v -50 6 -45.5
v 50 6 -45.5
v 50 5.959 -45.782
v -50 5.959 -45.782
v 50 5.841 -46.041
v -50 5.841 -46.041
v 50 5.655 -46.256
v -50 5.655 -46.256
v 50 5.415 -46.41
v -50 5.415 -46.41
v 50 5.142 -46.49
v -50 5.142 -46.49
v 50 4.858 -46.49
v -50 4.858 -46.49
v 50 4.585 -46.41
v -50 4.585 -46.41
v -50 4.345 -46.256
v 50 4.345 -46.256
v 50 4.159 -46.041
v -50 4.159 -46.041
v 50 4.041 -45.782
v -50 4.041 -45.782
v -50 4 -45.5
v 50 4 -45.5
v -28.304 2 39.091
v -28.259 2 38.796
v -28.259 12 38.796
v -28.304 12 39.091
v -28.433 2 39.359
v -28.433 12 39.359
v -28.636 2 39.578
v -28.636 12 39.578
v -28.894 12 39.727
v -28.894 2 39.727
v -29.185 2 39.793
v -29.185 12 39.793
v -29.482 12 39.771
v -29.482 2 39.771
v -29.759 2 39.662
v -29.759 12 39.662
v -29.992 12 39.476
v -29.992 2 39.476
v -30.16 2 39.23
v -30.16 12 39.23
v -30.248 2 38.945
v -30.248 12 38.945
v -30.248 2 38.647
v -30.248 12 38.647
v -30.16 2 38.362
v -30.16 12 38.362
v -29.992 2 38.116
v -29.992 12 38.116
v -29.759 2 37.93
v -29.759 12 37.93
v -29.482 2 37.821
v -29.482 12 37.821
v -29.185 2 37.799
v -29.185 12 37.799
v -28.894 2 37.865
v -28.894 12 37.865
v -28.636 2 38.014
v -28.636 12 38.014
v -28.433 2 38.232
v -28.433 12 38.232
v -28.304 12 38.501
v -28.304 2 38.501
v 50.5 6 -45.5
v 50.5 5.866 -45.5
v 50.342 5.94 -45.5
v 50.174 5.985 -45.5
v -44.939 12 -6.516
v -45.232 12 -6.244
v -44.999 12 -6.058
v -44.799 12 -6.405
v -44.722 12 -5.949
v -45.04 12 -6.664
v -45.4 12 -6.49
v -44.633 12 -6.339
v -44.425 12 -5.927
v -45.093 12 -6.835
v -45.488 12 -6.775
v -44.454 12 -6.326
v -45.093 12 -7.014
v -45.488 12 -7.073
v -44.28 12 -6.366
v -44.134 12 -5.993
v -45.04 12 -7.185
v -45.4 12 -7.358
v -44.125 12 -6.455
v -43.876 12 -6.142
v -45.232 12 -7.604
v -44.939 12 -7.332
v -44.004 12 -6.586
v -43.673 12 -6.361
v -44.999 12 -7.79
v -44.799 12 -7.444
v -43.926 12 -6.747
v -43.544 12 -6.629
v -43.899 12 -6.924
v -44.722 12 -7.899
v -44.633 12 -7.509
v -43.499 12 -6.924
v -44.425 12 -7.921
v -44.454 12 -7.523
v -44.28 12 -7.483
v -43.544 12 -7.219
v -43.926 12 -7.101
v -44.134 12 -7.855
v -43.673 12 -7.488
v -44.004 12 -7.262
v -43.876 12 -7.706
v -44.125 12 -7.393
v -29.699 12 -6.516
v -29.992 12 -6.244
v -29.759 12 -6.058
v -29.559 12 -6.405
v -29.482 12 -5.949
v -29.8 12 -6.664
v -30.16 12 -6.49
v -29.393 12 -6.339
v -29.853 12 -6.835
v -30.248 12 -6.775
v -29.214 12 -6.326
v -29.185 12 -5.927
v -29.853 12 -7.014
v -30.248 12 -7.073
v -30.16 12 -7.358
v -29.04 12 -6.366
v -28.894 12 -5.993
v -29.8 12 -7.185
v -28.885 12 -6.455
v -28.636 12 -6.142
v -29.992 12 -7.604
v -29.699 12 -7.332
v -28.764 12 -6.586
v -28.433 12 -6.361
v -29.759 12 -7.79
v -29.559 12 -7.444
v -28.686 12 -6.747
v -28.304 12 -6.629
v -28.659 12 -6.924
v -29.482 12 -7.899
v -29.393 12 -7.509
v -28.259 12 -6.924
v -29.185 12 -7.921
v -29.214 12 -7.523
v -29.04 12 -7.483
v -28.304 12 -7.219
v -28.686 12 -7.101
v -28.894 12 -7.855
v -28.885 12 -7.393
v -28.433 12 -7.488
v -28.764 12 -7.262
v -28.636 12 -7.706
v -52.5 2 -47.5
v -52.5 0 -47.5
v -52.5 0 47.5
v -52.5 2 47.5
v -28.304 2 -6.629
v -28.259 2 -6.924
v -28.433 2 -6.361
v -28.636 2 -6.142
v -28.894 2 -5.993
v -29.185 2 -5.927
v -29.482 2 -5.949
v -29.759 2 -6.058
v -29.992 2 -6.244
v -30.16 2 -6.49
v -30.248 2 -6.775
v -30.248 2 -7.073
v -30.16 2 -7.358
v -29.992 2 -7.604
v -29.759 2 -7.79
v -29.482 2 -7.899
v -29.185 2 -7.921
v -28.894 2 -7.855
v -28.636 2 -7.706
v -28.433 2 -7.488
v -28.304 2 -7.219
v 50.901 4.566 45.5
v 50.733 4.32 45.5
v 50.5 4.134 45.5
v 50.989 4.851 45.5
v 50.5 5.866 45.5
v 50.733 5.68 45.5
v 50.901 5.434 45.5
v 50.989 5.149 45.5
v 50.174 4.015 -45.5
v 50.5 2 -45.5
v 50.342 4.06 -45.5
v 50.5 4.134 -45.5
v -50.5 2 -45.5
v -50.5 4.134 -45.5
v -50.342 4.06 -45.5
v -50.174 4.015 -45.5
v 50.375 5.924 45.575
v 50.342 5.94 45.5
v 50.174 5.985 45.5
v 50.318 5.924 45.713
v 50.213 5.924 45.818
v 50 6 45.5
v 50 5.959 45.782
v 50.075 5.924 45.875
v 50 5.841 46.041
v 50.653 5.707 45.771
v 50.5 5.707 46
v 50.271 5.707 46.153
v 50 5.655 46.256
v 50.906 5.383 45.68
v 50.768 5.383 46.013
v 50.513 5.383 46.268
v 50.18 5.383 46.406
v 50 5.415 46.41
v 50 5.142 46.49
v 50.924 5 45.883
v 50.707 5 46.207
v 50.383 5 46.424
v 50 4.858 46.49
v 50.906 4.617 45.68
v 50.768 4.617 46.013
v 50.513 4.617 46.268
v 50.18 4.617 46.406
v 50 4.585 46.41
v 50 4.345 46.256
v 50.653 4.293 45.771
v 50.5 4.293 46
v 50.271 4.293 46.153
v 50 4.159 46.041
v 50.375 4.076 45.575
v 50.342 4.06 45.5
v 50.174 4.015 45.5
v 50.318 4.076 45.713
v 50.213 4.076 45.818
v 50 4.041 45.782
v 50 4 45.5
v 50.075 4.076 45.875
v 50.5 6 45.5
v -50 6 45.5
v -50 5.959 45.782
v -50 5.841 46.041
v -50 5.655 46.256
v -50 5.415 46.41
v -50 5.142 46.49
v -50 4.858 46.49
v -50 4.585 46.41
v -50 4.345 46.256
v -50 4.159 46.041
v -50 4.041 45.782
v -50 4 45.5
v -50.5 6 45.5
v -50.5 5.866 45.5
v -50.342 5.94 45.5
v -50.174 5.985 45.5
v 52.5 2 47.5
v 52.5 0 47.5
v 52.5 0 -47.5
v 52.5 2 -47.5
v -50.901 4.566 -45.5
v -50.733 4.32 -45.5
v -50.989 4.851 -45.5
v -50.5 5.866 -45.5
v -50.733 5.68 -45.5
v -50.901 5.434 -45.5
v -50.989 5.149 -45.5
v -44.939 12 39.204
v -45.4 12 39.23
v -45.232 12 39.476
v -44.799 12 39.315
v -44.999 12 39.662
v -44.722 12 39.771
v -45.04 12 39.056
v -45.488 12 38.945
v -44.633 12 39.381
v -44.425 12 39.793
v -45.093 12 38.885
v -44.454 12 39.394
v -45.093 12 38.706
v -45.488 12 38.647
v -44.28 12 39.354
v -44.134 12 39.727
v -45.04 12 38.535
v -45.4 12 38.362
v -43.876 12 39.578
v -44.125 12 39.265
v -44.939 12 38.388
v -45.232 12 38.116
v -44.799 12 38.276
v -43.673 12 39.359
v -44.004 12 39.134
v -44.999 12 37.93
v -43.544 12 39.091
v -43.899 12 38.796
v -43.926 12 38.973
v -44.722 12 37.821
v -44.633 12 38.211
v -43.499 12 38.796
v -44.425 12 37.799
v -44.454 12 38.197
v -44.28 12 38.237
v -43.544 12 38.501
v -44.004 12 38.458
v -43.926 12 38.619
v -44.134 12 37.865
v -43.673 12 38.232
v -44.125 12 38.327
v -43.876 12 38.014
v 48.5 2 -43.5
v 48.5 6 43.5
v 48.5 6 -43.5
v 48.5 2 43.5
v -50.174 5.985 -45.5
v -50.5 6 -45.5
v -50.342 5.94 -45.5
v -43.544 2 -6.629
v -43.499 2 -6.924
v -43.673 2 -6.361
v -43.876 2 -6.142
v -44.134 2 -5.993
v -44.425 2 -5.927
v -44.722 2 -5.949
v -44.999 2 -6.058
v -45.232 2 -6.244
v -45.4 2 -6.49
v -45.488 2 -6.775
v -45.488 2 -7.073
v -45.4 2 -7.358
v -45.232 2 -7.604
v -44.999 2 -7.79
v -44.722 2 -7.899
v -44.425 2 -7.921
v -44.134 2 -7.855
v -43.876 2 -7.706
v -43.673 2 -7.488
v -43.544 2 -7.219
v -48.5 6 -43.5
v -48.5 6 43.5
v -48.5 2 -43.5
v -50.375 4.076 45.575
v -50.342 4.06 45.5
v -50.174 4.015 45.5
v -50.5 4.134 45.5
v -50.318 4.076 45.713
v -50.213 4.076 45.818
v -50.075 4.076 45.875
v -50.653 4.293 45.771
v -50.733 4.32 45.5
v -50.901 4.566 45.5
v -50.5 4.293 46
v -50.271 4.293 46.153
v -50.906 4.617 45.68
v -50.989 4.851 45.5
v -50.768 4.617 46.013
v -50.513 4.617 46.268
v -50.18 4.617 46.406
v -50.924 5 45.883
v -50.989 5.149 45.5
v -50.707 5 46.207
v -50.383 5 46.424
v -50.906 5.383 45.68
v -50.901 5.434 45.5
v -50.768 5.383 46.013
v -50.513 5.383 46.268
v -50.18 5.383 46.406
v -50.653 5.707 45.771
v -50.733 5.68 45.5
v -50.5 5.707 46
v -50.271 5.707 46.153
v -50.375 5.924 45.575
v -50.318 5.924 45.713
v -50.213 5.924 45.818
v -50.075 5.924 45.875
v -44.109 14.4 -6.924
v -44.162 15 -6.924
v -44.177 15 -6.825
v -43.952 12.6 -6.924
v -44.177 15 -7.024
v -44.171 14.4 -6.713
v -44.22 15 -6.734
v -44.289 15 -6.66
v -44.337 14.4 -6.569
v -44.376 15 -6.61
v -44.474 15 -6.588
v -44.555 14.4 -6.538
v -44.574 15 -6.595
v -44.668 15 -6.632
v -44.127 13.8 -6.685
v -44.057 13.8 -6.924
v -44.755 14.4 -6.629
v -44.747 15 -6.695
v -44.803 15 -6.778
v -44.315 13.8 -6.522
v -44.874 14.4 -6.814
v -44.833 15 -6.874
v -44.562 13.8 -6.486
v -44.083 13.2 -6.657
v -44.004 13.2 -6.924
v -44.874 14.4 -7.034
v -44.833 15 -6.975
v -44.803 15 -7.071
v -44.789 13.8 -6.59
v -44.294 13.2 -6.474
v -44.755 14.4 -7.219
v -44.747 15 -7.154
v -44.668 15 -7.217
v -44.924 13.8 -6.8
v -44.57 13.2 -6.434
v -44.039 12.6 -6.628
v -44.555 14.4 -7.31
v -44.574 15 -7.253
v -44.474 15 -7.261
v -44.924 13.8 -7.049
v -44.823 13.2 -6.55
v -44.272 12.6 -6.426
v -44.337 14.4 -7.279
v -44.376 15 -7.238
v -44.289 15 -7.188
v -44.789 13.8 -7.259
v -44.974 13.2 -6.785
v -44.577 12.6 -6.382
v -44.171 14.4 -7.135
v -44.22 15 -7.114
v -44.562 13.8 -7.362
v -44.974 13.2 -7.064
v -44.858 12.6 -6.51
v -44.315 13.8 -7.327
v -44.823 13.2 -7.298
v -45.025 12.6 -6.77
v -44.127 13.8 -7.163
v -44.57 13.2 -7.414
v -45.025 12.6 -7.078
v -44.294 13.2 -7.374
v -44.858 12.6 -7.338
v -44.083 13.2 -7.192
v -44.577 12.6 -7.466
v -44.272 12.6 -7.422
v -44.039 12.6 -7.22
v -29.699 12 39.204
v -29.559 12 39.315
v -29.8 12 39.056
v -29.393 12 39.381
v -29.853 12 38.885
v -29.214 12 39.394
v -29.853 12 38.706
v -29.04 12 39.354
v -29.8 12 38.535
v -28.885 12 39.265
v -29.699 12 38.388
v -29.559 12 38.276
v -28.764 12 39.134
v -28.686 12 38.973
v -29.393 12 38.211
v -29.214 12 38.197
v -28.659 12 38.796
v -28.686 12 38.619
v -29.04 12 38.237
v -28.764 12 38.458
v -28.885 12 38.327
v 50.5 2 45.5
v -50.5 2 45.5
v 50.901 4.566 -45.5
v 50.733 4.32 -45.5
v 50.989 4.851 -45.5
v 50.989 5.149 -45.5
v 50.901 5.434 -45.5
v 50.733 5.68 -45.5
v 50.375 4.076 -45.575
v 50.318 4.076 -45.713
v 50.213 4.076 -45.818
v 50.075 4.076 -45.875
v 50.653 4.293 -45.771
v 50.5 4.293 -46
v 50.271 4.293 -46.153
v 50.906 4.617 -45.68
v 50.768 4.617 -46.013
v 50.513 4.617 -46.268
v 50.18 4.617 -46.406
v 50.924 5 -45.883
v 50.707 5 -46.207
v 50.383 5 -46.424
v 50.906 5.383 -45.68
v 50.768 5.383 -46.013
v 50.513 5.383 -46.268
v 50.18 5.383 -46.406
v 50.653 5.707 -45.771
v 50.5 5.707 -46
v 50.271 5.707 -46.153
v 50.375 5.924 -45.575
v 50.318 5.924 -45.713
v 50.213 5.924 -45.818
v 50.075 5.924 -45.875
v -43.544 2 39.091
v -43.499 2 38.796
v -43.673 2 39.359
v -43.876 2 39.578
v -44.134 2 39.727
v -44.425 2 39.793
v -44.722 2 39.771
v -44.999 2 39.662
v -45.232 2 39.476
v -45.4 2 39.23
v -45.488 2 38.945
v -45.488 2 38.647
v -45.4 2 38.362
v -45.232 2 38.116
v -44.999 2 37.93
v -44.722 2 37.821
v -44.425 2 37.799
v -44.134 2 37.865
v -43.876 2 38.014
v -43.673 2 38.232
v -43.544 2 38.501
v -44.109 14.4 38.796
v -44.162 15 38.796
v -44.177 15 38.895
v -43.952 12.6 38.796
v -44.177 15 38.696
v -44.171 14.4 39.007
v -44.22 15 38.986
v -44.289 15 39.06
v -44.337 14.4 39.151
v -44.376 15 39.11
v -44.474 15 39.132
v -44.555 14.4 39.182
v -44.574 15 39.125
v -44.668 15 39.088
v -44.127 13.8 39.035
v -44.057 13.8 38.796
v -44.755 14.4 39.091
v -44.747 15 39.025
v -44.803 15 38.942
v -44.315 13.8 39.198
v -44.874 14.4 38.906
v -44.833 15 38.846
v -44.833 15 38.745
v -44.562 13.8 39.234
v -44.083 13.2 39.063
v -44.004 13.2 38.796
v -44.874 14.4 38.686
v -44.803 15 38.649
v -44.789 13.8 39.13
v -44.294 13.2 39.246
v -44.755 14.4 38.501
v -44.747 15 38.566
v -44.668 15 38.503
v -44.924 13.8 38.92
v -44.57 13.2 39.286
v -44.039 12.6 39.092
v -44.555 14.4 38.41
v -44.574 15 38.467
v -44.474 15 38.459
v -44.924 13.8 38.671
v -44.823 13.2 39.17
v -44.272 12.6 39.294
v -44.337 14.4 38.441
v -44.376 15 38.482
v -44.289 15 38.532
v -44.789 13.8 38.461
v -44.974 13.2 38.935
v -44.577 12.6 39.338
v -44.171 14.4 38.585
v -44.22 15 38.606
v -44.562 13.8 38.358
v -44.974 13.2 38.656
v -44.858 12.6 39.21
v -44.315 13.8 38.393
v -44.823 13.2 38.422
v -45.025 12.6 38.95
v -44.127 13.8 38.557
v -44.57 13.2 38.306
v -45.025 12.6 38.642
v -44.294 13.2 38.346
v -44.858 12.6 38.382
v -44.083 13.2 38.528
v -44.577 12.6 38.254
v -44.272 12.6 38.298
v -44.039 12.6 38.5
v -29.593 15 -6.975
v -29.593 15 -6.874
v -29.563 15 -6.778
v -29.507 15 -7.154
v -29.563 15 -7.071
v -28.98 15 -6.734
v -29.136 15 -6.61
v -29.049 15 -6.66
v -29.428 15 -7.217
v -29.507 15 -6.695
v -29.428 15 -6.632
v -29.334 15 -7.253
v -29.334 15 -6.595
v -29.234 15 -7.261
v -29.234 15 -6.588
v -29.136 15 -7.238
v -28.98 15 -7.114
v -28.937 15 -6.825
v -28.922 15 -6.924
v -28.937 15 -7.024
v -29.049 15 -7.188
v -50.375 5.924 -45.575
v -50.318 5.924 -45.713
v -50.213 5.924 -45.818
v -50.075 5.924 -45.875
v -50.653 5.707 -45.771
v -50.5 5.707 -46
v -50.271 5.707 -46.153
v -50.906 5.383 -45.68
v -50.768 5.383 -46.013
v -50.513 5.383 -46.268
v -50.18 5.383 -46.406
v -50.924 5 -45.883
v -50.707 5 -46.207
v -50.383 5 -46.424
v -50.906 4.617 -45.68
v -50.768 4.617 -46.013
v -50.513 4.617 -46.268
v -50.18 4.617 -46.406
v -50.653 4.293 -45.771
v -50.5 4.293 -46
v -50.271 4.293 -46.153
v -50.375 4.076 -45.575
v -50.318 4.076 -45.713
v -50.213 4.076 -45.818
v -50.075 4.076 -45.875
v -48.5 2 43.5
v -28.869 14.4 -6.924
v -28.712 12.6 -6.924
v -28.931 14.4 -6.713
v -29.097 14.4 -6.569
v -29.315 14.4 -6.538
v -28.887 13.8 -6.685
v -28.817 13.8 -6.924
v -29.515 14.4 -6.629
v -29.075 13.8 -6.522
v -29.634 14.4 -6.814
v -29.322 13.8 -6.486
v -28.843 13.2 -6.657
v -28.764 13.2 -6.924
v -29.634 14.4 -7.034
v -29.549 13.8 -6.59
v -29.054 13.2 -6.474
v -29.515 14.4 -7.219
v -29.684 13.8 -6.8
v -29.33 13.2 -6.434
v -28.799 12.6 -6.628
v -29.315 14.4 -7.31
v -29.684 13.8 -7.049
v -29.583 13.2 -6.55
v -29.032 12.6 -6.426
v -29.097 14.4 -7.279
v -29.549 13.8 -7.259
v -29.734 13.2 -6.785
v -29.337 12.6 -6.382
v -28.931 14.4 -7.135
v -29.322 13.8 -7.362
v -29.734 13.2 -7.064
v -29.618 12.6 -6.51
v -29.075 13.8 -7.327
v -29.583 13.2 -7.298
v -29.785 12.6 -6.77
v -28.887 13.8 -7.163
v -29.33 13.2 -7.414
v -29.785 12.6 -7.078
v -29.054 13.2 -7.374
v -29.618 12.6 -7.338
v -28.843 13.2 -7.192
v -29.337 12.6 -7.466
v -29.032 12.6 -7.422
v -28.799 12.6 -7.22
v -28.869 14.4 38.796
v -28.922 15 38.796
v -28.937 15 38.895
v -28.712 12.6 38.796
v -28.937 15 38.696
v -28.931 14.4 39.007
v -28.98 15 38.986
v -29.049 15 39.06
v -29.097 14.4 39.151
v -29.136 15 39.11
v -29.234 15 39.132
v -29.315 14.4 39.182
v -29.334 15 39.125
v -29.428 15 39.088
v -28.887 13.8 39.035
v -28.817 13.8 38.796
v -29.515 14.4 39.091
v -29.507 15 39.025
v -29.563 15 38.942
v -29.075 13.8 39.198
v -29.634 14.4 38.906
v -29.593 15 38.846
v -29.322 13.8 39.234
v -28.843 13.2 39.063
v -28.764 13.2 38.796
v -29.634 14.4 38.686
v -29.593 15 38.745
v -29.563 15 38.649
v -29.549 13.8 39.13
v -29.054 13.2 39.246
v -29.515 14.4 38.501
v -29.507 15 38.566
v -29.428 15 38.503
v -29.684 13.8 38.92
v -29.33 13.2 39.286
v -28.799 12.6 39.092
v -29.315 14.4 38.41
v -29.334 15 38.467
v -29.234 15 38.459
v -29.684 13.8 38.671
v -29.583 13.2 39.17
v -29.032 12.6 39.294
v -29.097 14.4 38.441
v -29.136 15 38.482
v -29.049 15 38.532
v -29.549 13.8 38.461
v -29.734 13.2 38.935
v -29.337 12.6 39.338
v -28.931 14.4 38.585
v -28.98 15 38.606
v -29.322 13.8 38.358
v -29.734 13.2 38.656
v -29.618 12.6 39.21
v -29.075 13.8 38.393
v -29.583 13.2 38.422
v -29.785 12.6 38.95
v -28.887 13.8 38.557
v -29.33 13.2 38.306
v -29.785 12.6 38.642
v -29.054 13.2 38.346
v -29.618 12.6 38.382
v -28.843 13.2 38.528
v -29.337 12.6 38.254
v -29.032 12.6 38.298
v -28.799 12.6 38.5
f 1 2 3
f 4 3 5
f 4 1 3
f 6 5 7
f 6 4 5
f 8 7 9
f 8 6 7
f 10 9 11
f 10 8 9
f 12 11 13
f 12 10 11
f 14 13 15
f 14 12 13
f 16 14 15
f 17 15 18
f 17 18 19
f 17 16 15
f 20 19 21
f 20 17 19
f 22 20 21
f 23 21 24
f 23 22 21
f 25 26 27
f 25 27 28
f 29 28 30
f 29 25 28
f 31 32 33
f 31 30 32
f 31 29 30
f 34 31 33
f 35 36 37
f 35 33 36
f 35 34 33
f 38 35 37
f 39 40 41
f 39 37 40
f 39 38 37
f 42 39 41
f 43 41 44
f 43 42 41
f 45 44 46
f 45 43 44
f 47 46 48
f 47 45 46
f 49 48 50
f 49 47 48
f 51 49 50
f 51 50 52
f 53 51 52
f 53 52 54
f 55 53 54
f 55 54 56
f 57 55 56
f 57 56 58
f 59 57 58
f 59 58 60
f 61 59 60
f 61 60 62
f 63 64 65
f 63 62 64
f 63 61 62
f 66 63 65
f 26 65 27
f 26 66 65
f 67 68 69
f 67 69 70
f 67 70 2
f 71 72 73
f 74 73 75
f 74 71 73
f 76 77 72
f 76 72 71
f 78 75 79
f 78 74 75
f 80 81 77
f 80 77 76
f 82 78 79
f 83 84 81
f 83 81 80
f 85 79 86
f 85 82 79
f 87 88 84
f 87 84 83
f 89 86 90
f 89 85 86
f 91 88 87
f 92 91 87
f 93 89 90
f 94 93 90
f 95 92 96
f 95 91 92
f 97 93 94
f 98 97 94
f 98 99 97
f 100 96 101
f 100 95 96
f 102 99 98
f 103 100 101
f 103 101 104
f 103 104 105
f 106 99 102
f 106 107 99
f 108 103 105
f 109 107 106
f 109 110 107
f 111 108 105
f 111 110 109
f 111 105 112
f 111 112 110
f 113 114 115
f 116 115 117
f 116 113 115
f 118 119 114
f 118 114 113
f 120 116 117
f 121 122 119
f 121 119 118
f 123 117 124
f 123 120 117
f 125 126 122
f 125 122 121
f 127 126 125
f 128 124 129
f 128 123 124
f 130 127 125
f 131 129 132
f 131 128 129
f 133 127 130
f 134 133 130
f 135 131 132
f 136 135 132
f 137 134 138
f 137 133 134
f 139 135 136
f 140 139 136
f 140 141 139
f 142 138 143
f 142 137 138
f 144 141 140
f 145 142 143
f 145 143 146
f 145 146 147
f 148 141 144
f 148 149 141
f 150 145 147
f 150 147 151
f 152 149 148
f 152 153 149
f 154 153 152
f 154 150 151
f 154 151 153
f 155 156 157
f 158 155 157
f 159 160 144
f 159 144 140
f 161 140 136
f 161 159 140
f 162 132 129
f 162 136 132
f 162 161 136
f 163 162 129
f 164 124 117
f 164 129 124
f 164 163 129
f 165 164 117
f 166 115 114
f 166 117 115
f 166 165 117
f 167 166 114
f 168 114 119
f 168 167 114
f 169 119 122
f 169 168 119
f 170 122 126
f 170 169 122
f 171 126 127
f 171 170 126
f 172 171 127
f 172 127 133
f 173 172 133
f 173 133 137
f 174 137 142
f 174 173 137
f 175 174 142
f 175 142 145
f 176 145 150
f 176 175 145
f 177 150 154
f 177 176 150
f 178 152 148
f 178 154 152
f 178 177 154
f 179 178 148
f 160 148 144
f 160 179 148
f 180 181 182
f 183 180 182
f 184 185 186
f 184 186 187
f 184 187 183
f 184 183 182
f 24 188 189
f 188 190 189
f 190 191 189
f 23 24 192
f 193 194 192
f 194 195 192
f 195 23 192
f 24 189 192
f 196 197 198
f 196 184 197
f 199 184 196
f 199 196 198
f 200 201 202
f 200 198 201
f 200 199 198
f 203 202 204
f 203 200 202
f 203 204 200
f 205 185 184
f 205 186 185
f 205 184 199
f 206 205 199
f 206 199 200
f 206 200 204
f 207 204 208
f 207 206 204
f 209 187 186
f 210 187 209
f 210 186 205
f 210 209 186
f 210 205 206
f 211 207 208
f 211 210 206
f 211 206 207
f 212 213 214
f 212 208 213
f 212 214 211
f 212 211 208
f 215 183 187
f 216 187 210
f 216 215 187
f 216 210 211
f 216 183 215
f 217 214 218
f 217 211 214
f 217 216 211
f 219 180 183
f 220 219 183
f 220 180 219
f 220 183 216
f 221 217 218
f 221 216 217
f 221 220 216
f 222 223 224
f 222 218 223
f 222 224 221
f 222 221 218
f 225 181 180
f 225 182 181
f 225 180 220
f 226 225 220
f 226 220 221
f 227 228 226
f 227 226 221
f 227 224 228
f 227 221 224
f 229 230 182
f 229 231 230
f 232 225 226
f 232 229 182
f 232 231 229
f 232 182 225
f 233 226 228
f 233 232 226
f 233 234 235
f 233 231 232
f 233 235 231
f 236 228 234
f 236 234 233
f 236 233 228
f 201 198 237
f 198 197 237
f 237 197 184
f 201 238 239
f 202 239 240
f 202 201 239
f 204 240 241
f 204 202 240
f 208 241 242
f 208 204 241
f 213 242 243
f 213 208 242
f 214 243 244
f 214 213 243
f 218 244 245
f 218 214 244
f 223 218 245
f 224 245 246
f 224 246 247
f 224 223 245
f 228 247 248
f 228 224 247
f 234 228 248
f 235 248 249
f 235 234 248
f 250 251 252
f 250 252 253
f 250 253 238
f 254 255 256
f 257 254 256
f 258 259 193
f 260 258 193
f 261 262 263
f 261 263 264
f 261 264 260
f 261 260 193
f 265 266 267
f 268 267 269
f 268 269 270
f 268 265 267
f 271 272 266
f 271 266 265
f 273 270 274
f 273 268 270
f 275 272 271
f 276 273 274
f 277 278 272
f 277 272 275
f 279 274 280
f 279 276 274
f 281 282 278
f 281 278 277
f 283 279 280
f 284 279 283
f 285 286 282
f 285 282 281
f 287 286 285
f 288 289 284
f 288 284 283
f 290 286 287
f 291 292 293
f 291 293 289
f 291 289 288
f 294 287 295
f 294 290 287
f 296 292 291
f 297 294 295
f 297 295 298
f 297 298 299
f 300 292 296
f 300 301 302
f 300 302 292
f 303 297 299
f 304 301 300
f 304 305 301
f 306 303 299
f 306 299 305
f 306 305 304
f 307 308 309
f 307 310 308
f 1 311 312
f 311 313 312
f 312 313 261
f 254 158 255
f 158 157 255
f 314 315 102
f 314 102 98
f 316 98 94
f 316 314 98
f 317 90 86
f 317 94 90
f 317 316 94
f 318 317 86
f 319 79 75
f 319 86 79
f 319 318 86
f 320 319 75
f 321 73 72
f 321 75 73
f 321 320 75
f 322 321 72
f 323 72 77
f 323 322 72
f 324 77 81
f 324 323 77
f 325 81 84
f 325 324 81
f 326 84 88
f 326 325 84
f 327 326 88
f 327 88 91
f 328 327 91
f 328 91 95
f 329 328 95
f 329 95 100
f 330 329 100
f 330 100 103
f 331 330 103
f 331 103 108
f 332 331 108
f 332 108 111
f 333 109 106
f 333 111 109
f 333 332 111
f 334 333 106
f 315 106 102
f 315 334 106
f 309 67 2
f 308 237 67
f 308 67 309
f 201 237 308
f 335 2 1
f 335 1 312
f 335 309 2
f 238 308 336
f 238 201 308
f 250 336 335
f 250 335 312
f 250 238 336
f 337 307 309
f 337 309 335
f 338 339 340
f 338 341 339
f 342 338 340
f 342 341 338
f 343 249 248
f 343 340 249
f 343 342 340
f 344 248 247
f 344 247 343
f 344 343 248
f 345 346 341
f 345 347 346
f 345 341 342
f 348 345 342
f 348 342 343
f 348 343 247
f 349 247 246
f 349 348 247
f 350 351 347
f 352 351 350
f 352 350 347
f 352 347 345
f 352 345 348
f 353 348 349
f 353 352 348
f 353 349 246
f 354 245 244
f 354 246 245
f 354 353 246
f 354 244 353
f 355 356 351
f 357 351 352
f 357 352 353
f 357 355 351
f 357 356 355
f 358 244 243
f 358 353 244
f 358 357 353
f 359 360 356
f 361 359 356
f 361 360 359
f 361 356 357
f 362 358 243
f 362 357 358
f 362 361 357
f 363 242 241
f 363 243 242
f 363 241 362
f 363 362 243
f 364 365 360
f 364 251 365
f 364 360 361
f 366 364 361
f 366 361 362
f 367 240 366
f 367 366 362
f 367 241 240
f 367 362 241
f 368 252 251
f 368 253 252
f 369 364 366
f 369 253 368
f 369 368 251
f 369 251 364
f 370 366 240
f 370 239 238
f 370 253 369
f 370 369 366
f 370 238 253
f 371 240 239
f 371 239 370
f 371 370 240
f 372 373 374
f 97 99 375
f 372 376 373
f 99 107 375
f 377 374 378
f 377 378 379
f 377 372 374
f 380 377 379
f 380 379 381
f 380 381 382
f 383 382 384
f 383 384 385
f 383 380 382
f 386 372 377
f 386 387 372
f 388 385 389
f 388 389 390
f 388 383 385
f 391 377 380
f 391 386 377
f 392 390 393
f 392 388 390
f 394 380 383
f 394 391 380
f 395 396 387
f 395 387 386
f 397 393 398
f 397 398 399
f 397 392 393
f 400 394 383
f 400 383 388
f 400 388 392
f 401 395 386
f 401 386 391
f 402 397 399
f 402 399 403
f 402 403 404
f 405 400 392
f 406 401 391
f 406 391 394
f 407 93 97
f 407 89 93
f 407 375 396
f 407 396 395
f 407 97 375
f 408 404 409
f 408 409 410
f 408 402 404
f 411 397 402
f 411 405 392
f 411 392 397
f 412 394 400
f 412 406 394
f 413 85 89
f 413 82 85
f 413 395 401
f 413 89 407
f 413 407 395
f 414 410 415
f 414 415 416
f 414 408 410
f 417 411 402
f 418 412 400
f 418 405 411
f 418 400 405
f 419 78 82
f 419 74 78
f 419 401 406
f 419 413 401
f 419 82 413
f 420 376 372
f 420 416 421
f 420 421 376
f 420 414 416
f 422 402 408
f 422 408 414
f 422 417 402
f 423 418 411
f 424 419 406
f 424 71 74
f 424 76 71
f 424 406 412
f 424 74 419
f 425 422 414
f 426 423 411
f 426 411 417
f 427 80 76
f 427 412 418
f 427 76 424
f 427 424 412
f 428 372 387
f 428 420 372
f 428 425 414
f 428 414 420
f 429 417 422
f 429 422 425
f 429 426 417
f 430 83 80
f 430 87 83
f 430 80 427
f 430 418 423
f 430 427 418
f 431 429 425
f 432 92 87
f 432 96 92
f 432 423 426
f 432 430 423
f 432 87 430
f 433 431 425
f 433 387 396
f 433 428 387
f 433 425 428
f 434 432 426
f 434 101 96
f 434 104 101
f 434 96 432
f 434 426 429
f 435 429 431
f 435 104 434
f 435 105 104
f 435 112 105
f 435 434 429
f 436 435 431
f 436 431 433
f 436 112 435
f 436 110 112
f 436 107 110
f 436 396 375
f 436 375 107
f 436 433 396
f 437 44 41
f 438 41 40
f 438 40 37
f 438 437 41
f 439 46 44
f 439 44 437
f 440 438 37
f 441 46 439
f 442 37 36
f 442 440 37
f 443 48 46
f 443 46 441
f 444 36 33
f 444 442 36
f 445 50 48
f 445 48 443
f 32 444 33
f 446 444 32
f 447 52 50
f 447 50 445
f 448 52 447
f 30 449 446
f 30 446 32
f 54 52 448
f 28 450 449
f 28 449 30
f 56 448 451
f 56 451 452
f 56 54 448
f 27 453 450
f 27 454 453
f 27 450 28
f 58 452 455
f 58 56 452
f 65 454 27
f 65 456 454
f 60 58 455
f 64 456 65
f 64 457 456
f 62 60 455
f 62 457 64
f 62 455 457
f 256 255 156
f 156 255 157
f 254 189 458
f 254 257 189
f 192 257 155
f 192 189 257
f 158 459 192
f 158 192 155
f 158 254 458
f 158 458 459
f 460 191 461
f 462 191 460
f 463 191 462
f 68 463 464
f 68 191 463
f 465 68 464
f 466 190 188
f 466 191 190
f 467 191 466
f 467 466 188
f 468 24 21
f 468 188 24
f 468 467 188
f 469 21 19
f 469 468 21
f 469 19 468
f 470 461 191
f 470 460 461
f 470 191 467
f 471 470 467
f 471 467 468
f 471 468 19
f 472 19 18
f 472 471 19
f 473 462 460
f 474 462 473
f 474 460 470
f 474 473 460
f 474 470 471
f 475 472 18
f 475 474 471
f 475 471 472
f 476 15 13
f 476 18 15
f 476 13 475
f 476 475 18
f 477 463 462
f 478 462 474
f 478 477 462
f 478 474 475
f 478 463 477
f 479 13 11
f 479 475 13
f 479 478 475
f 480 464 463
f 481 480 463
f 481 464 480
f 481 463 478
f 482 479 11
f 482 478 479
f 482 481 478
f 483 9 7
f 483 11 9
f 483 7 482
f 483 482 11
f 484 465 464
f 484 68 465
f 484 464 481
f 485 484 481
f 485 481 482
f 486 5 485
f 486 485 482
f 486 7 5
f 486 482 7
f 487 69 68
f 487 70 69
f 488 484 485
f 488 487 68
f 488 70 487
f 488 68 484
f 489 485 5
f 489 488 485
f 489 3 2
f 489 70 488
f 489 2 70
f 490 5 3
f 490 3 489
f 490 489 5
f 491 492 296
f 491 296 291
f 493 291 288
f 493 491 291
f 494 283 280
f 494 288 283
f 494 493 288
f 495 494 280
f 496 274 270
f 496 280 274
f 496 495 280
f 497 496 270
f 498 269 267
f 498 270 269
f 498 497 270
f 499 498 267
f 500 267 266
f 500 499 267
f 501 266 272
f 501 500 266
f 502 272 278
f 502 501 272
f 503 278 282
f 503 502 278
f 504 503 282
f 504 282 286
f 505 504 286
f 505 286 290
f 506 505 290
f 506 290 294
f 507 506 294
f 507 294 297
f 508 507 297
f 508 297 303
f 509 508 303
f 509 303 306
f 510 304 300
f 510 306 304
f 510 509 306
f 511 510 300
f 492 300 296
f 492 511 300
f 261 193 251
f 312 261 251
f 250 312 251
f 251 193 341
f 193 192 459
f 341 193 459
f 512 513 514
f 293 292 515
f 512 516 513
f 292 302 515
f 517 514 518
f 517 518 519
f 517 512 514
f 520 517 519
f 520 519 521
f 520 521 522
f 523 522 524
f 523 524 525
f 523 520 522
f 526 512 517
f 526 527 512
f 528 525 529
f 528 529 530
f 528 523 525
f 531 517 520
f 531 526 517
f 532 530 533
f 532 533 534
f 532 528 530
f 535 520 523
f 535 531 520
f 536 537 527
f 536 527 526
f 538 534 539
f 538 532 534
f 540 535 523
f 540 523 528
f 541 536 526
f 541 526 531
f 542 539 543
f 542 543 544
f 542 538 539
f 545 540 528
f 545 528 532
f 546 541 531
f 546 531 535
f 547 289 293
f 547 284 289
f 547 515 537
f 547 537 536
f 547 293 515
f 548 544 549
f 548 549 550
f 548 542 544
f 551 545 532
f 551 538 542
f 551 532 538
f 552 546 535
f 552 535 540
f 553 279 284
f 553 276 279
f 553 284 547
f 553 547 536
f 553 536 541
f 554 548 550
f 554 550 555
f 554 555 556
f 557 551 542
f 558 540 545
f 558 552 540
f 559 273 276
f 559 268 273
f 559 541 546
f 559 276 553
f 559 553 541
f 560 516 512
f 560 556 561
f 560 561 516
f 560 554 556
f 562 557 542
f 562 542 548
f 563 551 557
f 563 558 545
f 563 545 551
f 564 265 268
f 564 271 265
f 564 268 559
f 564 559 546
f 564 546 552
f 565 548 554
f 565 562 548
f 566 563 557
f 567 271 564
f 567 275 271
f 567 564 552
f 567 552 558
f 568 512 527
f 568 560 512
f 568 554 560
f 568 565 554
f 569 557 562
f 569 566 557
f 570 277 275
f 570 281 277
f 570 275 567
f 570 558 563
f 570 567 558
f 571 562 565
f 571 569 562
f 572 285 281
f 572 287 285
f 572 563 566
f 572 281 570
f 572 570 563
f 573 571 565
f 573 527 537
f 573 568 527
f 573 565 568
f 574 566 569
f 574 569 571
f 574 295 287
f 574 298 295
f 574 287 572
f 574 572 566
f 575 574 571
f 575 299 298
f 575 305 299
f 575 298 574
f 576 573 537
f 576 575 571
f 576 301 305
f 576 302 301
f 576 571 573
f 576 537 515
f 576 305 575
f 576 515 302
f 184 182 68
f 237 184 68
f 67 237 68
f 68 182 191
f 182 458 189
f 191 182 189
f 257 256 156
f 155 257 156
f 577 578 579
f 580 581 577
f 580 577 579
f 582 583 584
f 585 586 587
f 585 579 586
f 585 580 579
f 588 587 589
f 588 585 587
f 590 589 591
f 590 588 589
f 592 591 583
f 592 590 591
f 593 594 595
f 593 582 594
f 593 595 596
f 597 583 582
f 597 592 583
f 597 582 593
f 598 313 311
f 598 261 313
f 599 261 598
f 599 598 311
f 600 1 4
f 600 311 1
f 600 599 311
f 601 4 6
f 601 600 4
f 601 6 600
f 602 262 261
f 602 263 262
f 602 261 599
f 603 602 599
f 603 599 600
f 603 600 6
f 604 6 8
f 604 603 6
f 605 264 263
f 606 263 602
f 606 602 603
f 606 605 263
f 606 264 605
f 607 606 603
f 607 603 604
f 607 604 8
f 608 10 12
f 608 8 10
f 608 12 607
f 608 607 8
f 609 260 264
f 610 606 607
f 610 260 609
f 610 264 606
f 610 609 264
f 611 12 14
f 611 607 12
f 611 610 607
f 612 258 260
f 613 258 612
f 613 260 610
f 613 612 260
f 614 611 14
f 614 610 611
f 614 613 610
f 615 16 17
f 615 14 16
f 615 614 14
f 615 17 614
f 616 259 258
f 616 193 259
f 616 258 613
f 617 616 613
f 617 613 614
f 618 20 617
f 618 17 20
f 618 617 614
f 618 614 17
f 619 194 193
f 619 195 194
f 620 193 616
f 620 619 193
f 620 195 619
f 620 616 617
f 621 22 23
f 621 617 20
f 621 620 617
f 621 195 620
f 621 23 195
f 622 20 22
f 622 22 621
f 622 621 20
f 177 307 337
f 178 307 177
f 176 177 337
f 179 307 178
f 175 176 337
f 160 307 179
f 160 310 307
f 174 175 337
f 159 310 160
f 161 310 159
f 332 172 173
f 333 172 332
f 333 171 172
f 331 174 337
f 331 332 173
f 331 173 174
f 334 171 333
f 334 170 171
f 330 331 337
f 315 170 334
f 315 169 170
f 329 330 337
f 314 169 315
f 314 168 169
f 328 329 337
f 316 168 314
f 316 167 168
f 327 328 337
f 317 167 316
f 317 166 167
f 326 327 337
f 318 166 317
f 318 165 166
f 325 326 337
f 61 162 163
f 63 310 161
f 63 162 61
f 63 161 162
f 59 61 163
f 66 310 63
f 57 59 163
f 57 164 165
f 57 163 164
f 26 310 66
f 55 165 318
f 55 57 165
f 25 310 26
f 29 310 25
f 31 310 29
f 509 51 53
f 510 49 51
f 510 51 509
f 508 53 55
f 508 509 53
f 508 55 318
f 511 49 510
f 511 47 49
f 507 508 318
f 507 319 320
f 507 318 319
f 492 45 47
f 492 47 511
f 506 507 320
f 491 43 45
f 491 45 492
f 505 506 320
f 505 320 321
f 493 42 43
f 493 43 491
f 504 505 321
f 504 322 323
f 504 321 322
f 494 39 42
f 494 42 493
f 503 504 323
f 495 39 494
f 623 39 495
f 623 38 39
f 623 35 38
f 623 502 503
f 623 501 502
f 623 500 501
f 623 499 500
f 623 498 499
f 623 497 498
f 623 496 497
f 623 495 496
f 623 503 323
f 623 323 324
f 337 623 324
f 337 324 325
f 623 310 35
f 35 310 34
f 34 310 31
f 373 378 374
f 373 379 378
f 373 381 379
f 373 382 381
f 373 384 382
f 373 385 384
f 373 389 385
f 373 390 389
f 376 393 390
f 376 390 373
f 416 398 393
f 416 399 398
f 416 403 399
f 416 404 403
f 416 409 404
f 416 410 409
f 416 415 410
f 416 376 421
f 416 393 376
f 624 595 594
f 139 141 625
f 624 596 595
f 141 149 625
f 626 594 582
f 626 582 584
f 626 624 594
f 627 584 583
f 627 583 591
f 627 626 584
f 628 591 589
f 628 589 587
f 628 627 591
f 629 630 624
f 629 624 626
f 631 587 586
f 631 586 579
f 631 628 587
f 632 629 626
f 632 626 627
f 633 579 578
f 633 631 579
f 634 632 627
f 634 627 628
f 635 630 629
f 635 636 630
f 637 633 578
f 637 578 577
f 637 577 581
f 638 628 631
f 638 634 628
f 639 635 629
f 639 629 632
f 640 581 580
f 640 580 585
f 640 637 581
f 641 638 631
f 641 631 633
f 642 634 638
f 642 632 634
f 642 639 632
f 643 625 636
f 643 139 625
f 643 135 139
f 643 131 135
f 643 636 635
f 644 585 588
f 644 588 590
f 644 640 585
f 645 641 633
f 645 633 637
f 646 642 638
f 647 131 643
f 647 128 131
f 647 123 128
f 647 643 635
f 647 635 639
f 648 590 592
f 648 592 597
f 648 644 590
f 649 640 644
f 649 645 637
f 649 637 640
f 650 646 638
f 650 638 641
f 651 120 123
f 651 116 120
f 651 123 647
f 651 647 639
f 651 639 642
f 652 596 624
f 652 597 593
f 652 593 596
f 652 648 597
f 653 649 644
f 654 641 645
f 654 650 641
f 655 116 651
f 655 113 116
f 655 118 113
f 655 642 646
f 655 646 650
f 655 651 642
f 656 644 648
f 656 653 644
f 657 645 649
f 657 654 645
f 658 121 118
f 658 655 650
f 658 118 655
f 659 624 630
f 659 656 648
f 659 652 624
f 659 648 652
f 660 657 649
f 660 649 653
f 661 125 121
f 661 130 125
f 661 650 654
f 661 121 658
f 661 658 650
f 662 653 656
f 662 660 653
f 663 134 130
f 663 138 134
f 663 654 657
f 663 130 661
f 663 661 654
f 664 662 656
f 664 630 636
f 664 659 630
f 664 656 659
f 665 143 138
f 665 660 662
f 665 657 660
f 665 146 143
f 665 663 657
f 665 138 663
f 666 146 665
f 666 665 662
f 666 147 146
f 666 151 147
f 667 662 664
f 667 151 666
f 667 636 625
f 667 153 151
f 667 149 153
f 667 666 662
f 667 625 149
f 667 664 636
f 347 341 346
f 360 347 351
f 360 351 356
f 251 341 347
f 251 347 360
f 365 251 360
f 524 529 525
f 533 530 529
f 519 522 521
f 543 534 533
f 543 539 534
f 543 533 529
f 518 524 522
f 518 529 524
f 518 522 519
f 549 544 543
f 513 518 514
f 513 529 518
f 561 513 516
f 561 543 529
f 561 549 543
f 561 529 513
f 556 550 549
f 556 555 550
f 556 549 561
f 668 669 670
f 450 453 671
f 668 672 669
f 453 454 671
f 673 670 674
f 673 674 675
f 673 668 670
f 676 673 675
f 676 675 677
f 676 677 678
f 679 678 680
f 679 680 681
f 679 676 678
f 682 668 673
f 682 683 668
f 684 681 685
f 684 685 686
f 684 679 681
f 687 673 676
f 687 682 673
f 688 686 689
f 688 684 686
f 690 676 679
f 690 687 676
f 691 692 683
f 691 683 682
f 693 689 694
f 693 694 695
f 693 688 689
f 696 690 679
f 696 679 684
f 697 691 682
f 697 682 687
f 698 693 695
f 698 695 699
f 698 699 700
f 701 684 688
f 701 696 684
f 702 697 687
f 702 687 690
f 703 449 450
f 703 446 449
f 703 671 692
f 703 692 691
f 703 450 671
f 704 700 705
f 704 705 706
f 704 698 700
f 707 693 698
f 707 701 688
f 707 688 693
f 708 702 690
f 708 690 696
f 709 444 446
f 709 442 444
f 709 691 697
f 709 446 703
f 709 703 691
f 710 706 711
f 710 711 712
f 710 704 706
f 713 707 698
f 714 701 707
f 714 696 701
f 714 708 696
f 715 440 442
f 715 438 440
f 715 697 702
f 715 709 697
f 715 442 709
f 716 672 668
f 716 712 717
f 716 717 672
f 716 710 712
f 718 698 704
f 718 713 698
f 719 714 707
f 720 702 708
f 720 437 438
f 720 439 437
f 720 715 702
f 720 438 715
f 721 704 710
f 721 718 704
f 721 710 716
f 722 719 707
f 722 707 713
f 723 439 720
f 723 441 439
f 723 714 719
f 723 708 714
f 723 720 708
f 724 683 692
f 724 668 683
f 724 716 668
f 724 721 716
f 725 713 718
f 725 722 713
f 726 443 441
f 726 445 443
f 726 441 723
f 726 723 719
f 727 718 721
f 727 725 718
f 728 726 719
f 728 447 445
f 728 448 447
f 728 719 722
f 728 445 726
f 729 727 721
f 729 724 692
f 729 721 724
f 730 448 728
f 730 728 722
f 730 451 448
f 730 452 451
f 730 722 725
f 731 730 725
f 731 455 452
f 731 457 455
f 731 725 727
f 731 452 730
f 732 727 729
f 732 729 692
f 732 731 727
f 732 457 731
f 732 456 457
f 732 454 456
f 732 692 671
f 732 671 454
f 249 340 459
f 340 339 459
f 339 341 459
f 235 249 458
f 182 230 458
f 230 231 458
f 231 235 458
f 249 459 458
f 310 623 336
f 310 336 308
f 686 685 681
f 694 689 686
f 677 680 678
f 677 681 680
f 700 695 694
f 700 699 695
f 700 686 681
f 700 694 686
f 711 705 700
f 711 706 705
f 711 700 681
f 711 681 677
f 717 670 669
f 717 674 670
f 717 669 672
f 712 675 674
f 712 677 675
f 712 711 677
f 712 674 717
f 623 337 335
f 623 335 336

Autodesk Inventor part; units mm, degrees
ref_plane "YZ Plane" through (0, 0, 0) normal (1, 0, 0) x (0, 1, 0)
ref_plane "XZ Plane" through (0, 0, 0) normal (0, 1, 0) x (-1, 0, 0)
ref_plane "XY Plane" through (0, 0, 0) normal (0, 0, 1) x (1, 0, 0)
sketch "Master_XZ" plane through (0, 0, 0) normal (0, 1, 0) x (-1, 0, 0)
  line L0 (52.5, 47.5) -> (-52.5, 47.5)
  line L1 (-52.5, 47.5) -> (-52.5, -47.5)
  line L2 (-52.5, -47.5) -> (52.5, -47.5)
  line L3 (52.5, -47.5) -> (52.5, 47.5)
  line L4 (52.5, 47.5) -> (-52.5, -47.5) construction
  line L5 (-52.5, 47.5) -> (52.5, -47.5) construction
  line L6 (50.5, 45.5) -> (-50.5, 45.5)
  line L7 (-50.5, 45.5) -> (-50.5, -45.5)
  line L8 (-50.5, -45.5) -> (50.5, -45.5)
  line L9 (50.5, -45.5) -> (50.5, 45.5)
  line L10 (48.5, 43.5) -> (-48.5, 43.5)
  line L11 (-48.5, 43.5) -> (-48.5, -43.5)
  line L12 (-48.5, -43.5) -> (48.5, -43.5)
  line L13 (48.5, -43.5) -> (48.5, 43.5)
  point P0 (0, 0)
  dimension "d0" = 2
  dimension "d1" = 2
  dimension "d10" = 105
  dimension "d15" = 95
extrude "Floor" add sketch "Master_XZ" along normal blind 2 contours L3 L2 L1 L0 | L9 L8 L7 L6 | L13 L12 L11 L10
extrude "Walls" add sketch "Master_XZ" along normal blind 6 contours L9 L8 L7 L6
sketch "Lip_profile" plane through (0, 1, -41.5) normal (1, 0, 0) x (0, 0, -1)
  line L0 (-87, 1) -> (-87, 5) projected
  circle A0 centre (-87, 4) radius 1
  line L1 (-87, 5) -> (4, 5) projected
  line L2 (-87, 5) -> (-87, 3)
  point P0 (-41.5, -1)
  dimension "d6" = 2
  dimension "d7" = 1
extrude "Lip" add sketch "Lip_profile" along normal mid plane 100
sketch "Sketch3" plane through (50, 1, -41.5) normal (1, 0, 0) x (0, 0, -1)
  line L0 (-87, 5) -> (-87, 3) projected
  line L1 (-87, 5) -> (-87, 3) projected
  arc A0 (-87, 5) -> (-87, 3) centre (-87, 4) ccw projected
  point P0 (-41.5, -1)
revolve "Lip_edge_right" add sketch "Sketch3" angle 90 about axis through (50, 6, 45.5) along (0, 1, 0)
sketch "Sketch4" plane through (-50, 1, -41.5) normal (-1, 0, 0) x (0, 0, 1)
  line L0 (87, 3) -> (87, 5) projected
  arc A0 (87, 3) -> (87, 5) centre (87, 4) ccw projected
  point P0 (41.5, -1)
revolve "Lip_edge_left" add sketch "Sketch4" angle 90 about axis through (-50, 4, 45.5) along (0, -1, 0)
pattern_circular "Circular Pattern1" count 2 over 360 about axis through (0, -10, 0) along (0, 1, 0) of "Lip", "Lip_edge_right", "Lip_edge_left"
sketch "Sketch6" plane through (0, 2, 0) normal (0, 1, 0) x (1, 0, 0)
  circle A0 centre (-44.4993, 6.9242) radius 0.6
  circle A1 centre (-29.2593, 6.9242) radius 0.6
  circle A2 centre (-29.2593, -38.7958) radius 0.6
  circle A3 centre (-44.4993, -38.7958) radius 0.6
  circle A4 centre (-29.2593, 6.9242) radius 1
  circle A5 centre (-44.4993, 6.9242) radius 1
  circle A6 centre (-44.4993, -38.7958) radius 1
  circle A7 centre (-29.2593, -38.7958) radius 1
  point P0 (0, 0)
  dimension "d18" = 1.2
  dimension "d19" = 1.2
  dimension "d20" = 1.2
  dimension "d21" = 1.2
  dimension "d22" = 45.72
  dimension "d23" = 15.24
  dimension "d26" = 0.4
  dimension "d27" = 0.4
  dimension "d28" = 0.4
  dimension "d29" = 0.4
extrude "Standoff_base" add sketch "Sketch6" along normal blind 10 contours A0 | A1 | A2 | A3 | A4 | A5 | A6 | A7
sketch "Sketch8" plane through (-44.4993, 12, -6.9242) normal (0, 1, 0) x (1, 0, 0)
  circle A0 centre (0, 0) radius 1 projected
  circle A1 centre (15.24, 0) radius 1 projected
  circle A2 centre (0, -45.72) radius 1 projected
  circle A3 centre (15.24, -45.72) radius 1 projected
  circle A4 centre (0, 0) radius 0.6
  circle A5 centre (15.24, 0) radius 0.6
  circle A6 centre (0, -45.72) radius 0.6
  circle A7 centre (15.24, -45.72) radius 0.6
  point P0 (44.4993, -6.9242)
  dimension "d32" = 0.4
  dimension "d33" = 0.4
  dimension "d34" = 0.4
  dimension "d35" = 0.4
extrude "Standoff_tip" add sketch "Sketch8" along normal blind 3 draft -5 contours A4 | A5 | A6 | A7
equation "\"d27\" = d26"
equation "\"d28\" = d26"
equation "\"d29\" = d26"
equation "\"d32\" = d26"
equation "\"d33\" = d26"
equation "\"d34\" = d26"
equation "\"d35\" = d26"
properties part number "BARB_bottom" material "ABS Plastic"
